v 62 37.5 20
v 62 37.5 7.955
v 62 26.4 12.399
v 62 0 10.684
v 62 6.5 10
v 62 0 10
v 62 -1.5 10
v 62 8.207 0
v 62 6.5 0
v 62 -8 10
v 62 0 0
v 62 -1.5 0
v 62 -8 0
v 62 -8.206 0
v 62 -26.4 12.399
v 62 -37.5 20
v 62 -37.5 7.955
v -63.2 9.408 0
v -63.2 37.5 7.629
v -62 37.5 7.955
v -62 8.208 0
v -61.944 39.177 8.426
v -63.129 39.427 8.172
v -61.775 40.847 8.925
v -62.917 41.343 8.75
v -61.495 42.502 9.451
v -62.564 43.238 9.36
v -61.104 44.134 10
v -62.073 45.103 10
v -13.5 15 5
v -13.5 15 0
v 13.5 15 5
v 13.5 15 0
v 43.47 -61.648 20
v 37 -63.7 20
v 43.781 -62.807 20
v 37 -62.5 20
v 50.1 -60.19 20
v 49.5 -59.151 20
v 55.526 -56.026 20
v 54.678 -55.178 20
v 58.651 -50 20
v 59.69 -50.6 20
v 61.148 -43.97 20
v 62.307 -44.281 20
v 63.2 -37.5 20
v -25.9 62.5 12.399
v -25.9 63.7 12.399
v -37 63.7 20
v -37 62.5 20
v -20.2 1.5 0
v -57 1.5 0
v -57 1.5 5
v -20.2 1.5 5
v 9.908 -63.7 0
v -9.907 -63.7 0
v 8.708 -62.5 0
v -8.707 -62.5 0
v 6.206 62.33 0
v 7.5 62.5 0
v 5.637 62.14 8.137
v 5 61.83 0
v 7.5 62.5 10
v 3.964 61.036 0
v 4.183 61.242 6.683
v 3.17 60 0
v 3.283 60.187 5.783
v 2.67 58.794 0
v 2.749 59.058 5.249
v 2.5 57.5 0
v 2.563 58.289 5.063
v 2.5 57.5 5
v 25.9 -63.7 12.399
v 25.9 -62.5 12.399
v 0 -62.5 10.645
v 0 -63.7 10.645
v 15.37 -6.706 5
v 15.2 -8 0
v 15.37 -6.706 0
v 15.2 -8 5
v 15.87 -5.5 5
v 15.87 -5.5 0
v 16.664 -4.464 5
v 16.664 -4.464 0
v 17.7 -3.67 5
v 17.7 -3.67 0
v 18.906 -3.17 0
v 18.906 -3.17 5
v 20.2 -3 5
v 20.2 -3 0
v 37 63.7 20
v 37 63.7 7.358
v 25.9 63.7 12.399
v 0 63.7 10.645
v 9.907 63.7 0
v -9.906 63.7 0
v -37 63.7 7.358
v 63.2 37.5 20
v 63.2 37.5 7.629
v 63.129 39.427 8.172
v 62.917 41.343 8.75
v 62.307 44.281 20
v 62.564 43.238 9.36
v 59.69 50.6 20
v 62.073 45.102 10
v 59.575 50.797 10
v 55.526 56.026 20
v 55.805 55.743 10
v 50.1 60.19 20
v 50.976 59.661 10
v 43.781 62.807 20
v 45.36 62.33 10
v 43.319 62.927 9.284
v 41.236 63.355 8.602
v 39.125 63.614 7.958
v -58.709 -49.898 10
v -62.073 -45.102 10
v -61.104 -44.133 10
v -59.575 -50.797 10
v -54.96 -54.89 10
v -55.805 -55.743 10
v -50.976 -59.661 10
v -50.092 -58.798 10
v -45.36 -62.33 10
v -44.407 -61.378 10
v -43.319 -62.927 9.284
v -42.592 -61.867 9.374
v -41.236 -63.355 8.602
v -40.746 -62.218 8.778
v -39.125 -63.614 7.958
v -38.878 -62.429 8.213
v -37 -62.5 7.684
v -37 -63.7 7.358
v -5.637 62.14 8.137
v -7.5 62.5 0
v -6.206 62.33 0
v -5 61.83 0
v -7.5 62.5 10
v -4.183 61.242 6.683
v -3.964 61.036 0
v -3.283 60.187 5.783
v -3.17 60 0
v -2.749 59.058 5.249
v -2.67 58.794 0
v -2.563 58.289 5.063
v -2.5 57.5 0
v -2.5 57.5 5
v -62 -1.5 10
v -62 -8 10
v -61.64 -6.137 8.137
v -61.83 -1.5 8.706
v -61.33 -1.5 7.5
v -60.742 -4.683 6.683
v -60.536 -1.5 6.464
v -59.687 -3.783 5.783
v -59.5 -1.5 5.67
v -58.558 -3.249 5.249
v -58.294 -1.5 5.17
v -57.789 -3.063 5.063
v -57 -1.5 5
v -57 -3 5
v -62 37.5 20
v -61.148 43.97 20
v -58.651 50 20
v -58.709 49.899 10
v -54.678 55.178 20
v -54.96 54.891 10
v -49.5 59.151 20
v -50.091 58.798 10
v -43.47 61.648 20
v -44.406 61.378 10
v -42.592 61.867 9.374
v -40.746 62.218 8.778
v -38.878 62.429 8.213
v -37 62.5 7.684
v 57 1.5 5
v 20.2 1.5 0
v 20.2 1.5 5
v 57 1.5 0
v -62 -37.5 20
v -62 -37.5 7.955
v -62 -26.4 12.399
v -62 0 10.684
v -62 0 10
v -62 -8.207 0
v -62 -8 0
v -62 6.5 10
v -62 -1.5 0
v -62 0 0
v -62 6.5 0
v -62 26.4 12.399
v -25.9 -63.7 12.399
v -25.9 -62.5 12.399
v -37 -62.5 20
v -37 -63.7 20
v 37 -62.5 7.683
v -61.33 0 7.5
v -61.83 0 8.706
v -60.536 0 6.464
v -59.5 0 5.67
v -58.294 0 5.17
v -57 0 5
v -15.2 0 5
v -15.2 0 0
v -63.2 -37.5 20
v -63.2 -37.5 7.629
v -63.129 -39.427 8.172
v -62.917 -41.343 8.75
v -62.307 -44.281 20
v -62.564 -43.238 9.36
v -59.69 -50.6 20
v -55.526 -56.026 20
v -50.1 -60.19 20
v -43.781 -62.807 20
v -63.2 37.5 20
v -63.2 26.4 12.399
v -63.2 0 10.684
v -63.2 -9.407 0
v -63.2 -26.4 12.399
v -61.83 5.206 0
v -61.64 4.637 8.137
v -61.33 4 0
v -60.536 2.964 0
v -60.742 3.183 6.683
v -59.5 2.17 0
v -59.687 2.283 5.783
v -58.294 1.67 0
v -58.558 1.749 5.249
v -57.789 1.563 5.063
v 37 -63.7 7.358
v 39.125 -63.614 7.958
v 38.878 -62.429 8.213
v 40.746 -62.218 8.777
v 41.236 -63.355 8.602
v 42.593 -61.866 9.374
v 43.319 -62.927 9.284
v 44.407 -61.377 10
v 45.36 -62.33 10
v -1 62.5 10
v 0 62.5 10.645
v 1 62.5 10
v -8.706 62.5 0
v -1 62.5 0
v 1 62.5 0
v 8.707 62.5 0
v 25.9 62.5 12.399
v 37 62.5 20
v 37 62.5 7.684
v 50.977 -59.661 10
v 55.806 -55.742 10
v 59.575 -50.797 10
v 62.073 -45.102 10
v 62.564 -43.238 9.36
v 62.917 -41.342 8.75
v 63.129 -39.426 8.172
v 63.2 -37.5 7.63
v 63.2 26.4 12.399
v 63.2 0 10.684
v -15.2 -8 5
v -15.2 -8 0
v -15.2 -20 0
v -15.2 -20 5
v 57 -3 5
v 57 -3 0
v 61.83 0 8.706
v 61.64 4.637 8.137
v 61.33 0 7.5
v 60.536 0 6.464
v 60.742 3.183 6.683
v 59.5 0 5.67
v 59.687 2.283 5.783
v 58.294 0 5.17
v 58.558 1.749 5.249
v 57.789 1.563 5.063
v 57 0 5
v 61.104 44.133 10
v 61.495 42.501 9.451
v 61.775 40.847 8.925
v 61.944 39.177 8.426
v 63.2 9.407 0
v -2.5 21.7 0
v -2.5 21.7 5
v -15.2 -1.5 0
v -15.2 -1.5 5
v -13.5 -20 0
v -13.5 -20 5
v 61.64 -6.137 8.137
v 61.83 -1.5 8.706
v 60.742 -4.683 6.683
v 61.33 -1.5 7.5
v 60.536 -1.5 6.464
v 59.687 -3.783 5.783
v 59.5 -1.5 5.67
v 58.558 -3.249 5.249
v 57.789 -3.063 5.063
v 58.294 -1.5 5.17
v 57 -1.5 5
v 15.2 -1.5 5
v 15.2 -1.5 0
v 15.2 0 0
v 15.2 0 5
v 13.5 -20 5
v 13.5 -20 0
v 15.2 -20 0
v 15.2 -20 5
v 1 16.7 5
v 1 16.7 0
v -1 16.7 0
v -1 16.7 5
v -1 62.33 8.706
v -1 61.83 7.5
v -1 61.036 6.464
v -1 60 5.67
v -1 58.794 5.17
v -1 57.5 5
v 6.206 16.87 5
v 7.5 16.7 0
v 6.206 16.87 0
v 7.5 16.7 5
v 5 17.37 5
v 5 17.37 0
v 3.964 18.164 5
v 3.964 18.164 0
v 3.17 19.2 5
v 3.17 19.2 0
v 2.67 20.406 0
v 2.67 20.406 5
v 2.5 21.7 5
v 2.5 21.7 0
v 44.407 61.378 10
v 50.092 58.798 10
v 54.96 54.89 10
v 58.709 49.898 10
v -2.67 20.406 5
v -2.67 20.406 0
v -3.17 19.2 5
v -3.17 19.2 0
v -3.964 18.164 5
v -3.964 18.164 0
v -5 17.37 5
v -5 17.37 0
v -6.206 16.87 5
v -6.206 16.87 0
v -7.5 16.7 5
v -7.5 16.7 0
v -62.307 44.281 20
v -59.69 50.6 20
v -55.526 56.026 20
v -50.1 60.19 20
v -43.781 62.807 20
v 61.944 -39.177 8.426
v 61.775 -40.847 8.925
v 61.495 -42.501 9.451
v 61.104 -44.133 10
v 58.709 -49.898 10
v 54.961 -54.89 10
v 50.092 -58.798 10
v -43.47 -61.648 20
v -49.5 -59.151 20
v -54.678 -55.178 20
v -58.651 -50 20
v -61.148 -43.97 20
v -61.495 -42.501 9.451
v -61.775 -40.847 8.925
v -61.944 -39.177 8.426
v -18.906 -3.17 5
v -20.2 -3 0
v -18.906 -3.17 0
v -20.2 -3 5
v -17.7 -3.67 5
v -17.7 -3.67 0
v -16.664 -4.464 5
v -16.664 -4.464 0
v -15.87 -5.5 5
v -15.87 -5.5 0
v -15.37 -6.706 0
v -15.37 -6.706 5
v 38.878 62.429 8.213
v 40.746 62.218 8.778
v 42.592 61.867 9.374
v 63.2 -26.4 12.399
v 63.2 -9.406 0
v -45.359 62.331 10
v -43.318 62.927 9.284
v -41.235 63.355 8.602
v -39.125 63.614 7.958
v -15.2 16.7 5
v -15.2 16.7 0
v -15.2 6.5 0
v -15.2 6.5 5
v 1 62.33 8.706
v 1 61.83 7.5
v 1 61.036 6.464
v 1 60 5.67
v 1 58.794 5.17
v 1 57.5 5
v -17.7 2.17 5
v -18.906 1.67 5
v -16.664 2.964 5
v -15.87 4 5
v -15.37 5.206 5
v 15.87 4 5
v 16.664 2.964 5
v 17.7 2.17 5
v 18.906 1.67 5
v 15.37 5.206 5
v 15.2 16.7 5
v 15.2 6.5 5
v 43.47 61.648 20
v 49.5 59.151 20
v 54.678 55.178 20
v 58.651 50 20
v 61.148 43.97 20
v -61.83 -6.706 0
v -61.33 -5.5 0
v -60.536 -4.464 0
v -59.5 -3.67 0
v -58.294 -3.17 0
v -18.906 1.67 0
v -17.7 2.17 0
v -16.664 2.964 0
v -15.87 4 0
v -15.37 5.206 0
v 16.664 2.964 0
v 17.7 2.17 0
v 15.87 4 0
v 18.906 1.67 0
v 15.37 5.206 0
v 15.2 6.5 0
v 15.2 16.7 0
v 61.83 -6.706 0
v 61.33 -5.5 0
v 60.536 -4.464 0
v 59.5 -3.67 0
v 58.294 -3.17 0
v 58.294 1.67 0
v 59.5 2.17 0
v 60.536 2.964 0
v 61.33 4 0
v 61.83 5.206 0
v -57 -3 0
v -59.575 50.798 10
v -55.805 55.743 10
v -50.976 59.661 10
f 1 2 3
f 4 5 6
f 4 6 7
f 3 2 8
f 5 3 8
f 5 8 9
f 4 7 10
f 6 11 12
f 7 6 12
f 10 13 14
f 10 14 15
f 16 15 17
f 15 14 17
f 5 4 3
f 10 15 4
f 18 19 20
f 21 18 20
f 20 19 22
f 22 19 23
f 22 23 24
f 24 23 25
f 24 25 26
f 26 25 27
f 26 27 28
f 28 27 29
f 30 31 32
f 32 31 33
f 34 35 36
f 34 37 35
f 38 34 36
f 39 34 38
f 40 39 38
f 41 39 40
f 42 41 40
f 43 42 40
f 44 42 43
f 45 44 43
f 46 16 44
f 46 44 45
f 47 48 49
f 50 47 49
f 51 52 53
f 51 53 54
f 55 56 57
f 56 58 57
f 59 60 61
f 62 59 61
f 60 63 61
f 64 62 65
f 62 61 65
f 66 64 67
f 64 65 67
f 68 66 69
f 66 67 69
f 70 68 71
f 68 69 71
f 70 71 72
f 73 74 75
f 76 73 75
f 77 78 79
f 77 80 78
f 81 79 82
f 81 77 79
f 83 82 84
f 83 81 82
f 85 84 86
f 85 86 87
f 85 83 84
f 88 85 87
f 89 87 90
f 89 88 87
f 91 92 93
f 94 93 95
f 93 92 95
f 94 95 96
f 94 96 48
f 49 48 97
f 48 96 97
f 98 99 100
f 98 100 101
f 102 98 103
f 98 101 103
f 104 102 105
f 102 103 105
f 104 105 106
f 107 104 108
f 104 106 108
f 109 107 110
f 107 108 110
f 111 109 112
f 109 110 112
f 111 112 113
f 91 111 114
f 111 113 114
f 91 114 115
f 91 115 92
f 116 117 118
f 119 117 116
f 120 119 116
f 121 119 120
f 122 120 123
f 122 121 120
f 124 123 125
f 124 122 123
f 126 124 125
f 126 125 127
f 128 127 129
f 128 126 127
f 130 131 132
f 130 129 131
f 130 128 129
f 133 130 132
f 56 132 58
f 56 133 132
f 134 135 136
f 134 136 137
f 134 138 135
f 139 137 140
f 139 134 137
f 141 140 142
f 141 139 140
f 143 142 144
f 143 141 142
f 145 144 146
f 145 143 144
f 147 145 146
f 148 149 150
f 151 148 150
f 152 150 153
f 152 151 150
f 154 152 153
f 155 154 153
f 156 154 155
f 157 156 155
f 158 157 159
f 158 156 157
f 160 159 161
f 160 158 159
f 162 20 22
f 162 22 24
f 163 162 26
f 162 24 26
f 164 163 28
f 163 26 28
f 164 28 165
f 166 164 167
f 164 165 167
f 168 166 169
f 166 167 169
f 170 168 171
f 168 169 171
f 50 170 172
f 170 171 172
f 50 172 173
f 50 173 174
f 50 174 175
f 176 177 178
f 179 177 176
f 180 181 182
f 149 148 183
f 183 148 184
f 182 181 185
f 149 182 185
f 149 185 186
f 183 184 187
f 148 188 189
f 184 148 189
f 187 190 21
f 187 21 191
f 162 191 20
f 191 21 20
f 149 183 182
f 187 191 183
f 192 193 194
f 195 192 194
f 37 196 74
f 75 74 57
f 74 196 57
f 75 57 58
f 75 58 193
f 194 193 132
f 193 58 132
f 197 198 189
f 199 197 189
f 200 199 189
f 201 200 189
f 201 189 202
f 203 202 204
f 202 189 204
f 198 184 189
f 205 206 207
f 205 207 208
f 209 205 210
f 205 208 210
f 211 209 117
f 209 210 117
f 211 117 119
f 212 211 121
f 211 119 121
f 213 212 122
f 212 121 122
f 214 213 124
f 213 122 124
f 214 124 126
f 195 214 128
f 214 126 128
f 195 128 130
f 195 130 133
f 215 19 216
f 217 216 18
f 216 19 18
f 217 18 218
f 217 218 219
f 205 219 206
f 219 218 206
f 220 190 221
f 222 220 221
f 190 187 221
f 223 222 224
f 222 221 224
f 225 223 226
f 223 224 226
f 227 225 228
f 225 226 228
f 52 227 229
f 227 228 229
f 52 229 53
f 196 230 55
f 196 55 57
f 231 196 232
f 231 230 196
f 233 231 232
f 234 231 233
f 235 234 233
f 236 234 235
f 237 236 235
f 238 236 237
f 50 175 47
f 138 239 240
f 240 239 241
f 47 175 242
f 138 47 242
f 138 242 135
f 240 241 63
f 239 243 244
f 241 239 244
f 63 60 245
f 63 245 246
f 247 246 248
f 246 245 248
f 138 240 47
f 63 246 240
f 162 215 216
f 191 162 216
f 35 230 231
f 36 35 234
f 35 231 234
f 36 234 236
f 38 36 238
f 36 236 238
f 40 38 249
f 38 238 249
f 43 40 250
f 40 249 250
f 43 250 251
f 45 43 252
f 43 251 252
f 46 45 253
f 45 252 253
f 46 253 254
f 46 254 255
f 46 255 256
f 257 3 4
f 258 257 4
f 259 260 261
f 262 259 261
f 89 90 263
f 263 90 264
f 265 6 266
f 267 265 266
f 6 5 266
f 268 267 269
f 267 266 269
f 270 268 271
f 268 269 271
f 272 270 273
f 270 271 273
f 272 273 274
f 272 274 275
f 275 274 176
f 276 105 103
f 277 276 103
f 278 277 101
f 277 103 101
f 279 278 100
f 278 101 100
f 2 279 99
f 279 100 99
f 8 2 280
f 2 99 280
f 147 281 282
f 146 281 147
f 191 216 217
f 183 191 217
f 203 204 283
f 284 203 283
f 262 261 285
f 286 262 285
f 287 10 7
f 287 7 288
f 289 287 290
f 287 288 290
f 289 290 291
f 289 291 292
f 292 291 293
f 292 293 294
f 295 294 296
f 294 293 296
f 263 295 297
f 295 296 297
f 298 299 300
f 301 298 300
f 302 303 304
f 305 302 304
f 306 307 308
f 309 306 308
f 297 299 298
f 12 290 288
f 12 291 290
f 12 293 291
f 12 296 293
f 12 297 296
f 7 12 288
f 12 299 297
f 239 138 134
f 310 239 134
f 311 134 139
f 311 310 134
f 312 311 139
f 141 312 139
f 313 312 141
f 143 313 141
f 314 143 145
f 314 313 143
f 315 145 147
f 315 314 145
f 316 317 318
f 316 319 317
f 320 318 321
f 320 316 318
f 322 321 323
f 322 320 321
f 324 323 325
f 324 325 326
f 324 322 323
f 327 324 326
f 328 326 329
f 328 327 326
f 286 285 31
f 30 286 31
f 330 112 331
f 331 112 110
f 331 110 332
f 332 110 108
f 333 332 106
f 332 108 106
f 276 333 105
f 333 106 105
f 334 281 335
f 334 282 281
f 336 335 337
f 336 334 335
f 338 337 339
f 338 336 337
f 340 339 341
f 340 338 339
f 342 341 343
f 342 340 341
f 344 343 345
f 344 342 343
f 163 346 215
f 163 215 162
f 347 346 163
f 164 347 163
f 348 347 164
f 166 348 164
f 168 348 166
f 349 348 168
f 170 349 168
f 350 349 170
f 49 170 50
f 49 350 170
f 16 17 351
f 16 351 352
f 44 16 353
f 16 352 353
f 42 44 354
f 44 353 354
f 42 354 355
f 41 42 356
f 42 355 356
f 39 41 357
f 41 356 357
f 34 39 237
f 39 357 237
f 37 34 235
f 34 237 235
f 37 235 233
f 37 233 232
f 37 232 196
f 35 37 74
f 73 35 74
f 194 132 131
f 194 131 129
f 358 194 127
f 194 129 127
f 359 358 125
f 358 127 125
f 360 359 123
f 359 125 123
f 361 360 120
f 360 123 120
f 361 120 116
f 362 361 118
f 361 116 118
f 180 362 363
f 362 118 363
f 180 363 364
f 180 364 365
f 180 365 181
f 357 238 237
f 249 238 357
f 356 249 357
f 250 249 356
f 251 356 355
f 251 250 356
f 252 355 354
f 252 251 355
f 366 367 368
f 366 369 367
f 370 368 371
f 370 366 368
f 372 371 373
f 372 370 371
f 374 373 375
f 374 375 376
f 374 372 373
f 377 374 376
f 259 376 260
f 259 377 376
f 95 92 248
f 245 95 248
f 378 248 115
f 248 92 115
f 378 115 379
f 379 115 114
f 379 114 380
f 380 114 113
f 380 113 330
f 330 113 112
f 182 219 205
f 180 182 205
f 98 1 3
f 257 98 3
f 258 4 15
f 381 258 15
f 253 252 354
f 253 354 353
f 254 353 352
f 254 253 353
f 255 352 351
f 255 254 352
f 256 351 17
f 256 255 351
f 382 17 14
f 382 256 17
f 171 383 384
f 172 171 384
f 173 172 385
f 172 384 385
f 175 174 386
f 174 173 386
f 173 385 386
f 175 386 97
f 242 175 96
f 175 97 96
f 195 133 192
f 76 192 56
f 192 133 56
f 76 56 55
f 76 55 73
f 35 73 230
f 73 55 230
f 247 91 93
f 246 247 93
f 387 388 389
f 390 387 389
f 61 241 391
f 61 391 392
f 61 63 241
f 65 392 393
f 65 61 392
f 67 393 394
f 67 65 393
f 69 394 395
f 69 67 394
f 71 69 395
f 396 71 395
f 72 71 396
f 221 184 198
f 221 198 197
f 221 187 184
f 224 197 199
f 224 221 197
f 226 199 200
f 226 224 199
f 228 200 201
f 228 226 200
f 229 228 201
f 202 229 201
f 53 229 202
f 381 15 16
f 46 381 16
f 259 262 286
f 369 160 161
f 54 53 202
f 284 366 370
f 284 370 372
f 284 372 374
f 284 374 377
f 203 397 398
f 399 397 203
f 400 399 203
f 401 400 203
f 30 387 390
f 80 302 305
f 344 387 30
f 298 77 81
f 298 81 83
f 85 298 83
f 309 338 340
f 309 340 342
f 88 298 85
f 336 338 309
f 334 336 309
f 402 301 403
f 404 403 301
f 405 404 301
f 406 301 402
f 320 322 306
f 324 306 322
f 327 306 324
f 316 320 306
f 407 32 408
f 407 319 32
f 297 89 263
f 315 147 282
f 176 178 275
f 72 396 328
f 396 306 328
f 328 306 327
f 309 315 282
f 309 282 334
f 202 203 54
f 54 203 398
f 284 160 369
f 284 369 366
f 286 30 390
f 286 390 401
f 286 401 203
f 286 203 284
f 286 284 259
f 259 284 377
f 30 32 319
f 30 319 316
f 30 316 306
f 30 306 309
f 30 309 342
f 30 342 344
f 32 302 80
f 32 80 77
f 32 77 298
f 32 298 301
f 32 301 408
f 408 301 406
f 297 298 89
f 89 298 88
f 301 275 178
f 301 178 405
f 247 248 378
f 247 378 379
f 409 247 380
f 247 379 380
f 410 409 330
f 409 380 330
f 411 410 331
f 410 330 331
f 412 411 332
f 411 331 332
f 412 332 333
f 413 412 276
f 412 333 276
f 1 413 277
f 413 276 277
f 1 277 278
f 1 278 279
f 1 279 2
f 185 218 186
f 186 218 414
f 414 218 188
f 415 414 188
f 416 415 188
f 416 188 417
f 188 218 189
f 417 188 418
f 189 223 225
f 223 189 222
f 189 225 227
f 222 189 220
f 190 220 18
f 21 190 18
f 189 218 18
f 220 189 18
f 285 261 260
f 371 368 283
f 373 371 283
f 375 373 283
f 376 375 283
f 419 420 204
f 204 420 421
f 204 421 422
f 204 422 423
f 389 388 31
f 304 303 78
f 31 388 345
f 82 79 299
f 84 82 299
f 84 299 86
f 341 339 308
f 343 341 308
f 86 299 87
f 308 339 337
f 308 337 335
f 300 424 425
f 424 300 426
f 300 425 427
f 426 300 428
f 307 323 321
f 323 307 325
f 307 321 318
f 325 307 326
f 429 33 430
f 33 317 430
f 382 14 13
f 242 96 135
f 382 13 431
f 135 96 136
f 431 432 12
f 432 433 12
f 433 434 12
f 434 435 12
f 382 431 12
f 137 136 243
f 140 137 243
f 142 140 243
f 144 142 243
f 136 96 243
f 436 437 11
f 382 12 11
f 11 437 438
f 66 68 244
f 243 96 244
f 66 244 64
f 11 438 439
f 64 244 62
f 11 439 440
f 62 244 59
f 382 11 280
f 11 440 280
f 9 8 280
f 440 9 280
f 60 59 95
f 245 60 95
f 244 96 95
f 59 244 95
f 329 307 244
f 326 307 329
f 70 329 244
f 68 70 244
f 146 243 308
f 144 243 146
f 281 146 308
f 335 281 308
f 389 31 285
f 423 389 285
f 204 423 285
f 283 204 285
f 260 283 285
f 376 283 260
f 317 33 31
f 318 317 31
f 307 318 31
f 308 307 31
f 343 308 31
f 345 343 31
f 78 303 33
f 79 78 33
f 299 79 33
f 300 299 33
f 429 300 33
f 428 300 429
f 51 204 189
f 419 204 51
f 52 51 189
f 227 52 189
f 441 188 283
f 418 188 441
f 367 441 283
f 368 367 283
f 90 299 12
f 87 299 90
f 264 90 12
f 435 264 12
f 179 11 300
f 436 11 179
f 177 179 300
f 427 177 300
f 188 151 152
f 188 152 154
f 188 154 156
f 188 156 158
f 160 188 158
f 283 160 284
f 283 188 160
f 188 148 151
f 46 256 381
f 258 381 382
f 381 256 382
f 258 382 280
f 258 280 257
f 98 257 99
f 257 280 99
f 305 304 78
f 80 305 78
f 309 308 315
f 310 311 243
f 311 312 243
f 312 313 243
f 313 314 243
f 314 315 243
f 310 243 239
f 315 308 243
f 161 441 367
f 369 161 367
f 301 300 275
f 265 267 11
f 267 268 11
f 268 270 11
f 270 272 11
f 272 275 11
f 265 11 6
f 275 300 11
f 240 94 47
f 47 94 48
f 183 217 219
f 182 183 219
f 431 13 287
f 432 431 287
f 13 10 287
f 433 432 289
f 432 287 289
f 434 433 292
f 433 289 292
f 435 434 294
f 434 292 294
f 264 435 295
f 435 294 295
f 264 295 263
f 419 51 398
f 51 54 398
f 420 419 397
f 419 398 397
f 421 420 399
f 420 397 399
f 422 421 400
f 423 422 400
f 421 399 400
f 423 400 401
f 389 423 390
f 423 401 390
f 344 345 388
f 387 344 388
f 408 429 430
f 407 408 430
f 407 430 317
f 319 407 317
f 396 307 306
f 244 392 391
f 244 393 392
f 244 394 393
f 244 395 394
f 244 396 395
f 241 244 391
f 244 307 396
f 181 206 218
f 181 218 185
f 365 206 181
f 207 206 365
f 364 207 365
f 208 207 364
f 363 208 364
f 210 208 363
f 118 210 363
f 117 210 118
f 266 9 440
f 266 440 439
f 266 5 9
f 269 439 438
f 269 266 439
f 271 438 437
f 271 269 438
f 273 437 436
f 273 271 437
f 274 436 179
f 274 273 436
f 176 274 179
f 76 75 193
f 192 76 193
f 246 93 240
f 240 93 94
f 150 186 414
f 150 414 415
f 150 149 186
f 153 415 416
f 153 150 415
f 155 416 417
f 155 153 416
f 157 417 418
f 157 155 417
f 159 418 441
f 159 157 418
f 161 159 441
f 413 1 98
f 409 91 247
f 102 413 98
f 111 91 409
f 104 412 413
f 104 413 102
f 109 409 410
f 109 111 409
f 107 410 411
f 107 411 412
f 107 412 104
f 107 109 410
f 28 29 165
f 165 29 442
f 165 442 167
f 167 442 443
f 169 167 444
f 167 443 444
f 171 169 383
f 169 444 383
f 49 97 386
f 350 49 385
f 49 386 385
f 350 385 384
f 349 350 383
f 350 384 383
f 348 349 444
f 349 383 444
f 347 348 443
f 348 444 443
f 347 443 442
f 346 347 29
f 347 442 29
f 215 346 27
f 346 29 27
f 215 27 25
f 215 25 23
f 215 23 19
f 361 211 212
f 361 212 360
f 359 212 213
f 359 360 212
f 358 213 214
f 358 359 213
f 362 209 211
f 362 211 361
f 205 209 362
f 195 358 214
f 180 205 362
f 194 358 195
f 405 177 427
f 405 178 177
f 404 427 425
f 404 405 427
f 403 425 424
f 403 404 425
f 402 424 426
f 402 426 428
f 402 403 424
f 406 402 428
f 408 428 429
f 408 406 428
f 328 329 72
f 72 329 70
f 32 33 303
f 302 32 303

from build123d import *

# Parameters (mm, degrees)
F1_DEPTH  = 20
F0_W      = 1.5
F0_H      = 45.8000004292
F0_W_2    = 46.8000004292
F0_H_2    = 1.5
F2_DEPTH  = 5
F3_R      = 5
F5_DEPTH  = 150.7
F7_DEPTH  = 137.6
F13_DEPTH = 60
F14_DEPTH = 56.1
F20_DEPTH = 72.8
F21_DEPTH = 71.7


with BuildPart() as f1:
    # F0 (on Top) → F1 (new body)
    with BuildSketch(Plane.XY):
        with BuildLine():
            Line((37, 63.7), (-37, 63.7))
            ThreePointArc((-37, 63.7), (-55.5261976671, 56.0261976671), (-63.2, 37.5))
            Line((-63.2, 37.5), (-63.2, -37.5))
            ThreePointArc((-63.2, -37.5), (-55.5261976671, -56.0261976671), (-37, -63.7))
            Line((-37, -63.7), (37, -63.7))
            ThreePointArc((37, -63.7), (55.5261976671, -56.0261976671), (63.2, -37.5))
            Line((63.2, -37.5), (63.2, 37.5))
            ThreePointArc((63.2, 37.5), (55.5261976671, 56.0261976671), (37, 63.7))
        make_face()
        with BuildLine():
            ThreePointArc((-62, 37.5), (-54.6776695297, 55.1776695297), (-37, 62.5))
            Line((-37, 62.5), (-2.5, 62.5))
            Line((-2.5, 62.5), (-1, 62.5))
            Line((-1, 62.5), (1, 62.5))
            Line((1, 62.5), (2.5, 62.5))
            Line((2.5, 62.5), (37, 62.5))
            ThreePointArc((37, 62.5), (54.6776695297, 55.1776695297), (62, 37.5))
            Line((62, 37.5), (62, 1.5))
            Line((62, 1.5), (62, 0))
            Line((62, 0), (62, -1.5))
            Line((62, -1.5), (62, -3))
            Line((62, -3), (62, -37.5))
            ThreePointArc((62, -37.5), (54.6776695297, -55.1776695297), (37, -62.5))
            Line((37, -62.5), (-37, -62.5))
            ThreePointArc((-37, -62.5), (-54.6776695297, -55.1776695297), (-62, -37.5))
            Line((-62, -37.5), (-62, -3))
            Line((-62, -3), (-62, -1.5))
            Line((-62, -1.5), (-62, 0))
            Line((-62, 0), (-62, 1.5))
            Line((-62, 1.5), (-62, 37.5))
        make_face(mode=Mode.SUBTRACT)
    extrude(amount=F1_DEPTH)

    # F0 (on Top) → F2 (join)
    with BuildSketch(Plane.XY):
        with Locations((1.75, 39.5999997854)):
            Rectangle(F0_W, F0_H)
        Polygon((-1, 16.6999995708), (-2.5, 16.6999995708), (-15.1999995708, 16.6999995708), (-15.1999995708, 1.5), (-15.1999995708, 0), (-15.1999995708, -1.5), (-15.1999995708, -3), (-15.1999995708, -16.6999995708), (-15.1999995708, -20), (-13.5, -20), (-13.5, -15), (-13.5, 15), (13.5, 15), (13.5, -15), (13.5, -20), (15.1999995708, -20), (15.1999995708, -15), (15.1999995708, -3), (15.1999995708, -1.5), (15.1999995708, 0), (15.1999995708, 1.5), (15.1999995708, 16.6999995708), (2.5, 16.6999995708), (1, 16.6999995708), align=None)
        with Locations((-1.75, 39.5999997854)):
            Rectangle(F0_W, F0_H)
        with Locations((-38.5999997854, 0.75)):
            Rectangle(F0_W_2, F0_H_2)
        with Locations((-38.5999997854, -2.25)):
            Rectangle(F0_W_2, F0_H_2)
        with Locations((38.5999997854, 0.75)):
            Rectangle(F0_W_2, F0_H_2)
        with Locations((38.5999997854, -2.25)):
            Rectangle(F0_W_2, F0_H_2)
    extrude(amount=F2_DEPTH)

    # F3
    f3_edges = [f1.edges().sort_by_distance(p)[0] for p in [
        (-2.5, 62.5, 2.5),
        (2.5, 62.5, 2.5),
        (-2.5, 16.7, 2.5),
        (2.5, 16.7, 2.5),
        (62, 1.5, 2.5),
        (15.2, 1.5, 2.5),
        (62, -3, 2.5),
        (15.2, -3, 2.5),
        (-15.2, -3, 2.5),
        (-62, -3, 2.5),
        (-62, 1.5, 2.5),
        (-15.2, 1.5, 2.5),
        (1.75, 62.5, 5),
        (-1.75, 62.5, 5),
        (62, 0.75, 5),
        (62, -2.25, 5),
        (-62, 0.75, 5),
        (-62, -2.25, 5),
    ]]
    fillet(f3_edges, radius=F3_R)

    # F4 (on face) → F5 (cut)
    with BuildSketch(Plane(origin=(0, 63.7, 0), x_dir=(-1, 0, 0), z_dir=(0, 1, 0))):
        Polygon((37, 20), (-37, 20), (-25.8996840566, 12.3994192109), (0, 10.6452321634), (25.8996840566, 12.3994192109), align=None)
    extrude(amount=-F5_DEPTH, mode=Mode.SUBTRACT)

    # F6 (on face) → F7 (cut)
    with BuildSketch(Plane(origin=(-63.2, 0, 0), x_dir=(0, -1, 0), z_dir=(-1, 0, 0))):
        Polygon((37.5, 20), (-37.5, 20), (-26.3996840566, 12.3994192109), (0, 10.6842042878), (26.3996840566, 12.3994192109), align=None)
    extrude(amount=-F7_DEPTH, mode=Mode.SUBTRACT)

    # F12 (on face) → F13 (cut)
    with BuildSketch(Plane(origin=(-74.2462120246, -74.2462120246, 0), x_dir=(-0.7071067812, 0.7071067812, 0), z_dir=(0.7071067812, 0.7071067812, 0))):
        Polygon((-12, 10), (-38.037519902, 0), (38.037519902, 0), (12, 10), (0, 10), align=None)
    extrude(amount=F13_DEPTH, mode=Mode.SUBTRACT)

    # F10 (on face) → F14 (cut)
    with BuildSketch(Plane(origin=(71.6299169342, 71.6299169342, 0), x_dir=(-0.7071067812, 0.7071067812, 0), z_dir=(0.7071067812, 0.7071067812, 0))):
        Polygon((-38.037519902, 0), (0, 0), (0, 10), (-12, 10), align=None)
        Polygon((0, 10), (0, 0), (38.037519902, 0), (12, 10), align=None)
    extrude(amount=-F14_DEPTH, mode=Mode.SUBTRACT)

    # F19 (on face) → F20 (cut)
    with BuildSketch(Plane(origin=(84.1457069612, -84.1457069612, 0), x_dir=(-0.7071067812, -0.7071067812, 0), z_dir=(-0.7071067812, 0.7071067812, 0))):
        Polygon((-12.000480098, 10), (-38.038, 0), (38.037039804, 0), (11.999519902, 10), (-0.000480098, 10), align=None)
    extrude(amount=F20_DEPTH, mode=Mode.SUBTRACT)

    # F18 (on face) → F21 (cut)
    with BuildSketch(Plane(origin=(-82.0243866176, 82.0243866176, 0), x_dir=(-0.7071067812, -0.7071067812, 0), z_dir=(-0.7071067812, 0.7071067812, 0))):
        Polygon((-12.000480098, 10), (-38.038, 0), (38.037039804, 0), (11.999519902, 10), (-0.000480098, 10), align=None)
    extrude(amount=-F21_DEPTH, mode=Mode.SUBTRACT)


solid = f1.part
